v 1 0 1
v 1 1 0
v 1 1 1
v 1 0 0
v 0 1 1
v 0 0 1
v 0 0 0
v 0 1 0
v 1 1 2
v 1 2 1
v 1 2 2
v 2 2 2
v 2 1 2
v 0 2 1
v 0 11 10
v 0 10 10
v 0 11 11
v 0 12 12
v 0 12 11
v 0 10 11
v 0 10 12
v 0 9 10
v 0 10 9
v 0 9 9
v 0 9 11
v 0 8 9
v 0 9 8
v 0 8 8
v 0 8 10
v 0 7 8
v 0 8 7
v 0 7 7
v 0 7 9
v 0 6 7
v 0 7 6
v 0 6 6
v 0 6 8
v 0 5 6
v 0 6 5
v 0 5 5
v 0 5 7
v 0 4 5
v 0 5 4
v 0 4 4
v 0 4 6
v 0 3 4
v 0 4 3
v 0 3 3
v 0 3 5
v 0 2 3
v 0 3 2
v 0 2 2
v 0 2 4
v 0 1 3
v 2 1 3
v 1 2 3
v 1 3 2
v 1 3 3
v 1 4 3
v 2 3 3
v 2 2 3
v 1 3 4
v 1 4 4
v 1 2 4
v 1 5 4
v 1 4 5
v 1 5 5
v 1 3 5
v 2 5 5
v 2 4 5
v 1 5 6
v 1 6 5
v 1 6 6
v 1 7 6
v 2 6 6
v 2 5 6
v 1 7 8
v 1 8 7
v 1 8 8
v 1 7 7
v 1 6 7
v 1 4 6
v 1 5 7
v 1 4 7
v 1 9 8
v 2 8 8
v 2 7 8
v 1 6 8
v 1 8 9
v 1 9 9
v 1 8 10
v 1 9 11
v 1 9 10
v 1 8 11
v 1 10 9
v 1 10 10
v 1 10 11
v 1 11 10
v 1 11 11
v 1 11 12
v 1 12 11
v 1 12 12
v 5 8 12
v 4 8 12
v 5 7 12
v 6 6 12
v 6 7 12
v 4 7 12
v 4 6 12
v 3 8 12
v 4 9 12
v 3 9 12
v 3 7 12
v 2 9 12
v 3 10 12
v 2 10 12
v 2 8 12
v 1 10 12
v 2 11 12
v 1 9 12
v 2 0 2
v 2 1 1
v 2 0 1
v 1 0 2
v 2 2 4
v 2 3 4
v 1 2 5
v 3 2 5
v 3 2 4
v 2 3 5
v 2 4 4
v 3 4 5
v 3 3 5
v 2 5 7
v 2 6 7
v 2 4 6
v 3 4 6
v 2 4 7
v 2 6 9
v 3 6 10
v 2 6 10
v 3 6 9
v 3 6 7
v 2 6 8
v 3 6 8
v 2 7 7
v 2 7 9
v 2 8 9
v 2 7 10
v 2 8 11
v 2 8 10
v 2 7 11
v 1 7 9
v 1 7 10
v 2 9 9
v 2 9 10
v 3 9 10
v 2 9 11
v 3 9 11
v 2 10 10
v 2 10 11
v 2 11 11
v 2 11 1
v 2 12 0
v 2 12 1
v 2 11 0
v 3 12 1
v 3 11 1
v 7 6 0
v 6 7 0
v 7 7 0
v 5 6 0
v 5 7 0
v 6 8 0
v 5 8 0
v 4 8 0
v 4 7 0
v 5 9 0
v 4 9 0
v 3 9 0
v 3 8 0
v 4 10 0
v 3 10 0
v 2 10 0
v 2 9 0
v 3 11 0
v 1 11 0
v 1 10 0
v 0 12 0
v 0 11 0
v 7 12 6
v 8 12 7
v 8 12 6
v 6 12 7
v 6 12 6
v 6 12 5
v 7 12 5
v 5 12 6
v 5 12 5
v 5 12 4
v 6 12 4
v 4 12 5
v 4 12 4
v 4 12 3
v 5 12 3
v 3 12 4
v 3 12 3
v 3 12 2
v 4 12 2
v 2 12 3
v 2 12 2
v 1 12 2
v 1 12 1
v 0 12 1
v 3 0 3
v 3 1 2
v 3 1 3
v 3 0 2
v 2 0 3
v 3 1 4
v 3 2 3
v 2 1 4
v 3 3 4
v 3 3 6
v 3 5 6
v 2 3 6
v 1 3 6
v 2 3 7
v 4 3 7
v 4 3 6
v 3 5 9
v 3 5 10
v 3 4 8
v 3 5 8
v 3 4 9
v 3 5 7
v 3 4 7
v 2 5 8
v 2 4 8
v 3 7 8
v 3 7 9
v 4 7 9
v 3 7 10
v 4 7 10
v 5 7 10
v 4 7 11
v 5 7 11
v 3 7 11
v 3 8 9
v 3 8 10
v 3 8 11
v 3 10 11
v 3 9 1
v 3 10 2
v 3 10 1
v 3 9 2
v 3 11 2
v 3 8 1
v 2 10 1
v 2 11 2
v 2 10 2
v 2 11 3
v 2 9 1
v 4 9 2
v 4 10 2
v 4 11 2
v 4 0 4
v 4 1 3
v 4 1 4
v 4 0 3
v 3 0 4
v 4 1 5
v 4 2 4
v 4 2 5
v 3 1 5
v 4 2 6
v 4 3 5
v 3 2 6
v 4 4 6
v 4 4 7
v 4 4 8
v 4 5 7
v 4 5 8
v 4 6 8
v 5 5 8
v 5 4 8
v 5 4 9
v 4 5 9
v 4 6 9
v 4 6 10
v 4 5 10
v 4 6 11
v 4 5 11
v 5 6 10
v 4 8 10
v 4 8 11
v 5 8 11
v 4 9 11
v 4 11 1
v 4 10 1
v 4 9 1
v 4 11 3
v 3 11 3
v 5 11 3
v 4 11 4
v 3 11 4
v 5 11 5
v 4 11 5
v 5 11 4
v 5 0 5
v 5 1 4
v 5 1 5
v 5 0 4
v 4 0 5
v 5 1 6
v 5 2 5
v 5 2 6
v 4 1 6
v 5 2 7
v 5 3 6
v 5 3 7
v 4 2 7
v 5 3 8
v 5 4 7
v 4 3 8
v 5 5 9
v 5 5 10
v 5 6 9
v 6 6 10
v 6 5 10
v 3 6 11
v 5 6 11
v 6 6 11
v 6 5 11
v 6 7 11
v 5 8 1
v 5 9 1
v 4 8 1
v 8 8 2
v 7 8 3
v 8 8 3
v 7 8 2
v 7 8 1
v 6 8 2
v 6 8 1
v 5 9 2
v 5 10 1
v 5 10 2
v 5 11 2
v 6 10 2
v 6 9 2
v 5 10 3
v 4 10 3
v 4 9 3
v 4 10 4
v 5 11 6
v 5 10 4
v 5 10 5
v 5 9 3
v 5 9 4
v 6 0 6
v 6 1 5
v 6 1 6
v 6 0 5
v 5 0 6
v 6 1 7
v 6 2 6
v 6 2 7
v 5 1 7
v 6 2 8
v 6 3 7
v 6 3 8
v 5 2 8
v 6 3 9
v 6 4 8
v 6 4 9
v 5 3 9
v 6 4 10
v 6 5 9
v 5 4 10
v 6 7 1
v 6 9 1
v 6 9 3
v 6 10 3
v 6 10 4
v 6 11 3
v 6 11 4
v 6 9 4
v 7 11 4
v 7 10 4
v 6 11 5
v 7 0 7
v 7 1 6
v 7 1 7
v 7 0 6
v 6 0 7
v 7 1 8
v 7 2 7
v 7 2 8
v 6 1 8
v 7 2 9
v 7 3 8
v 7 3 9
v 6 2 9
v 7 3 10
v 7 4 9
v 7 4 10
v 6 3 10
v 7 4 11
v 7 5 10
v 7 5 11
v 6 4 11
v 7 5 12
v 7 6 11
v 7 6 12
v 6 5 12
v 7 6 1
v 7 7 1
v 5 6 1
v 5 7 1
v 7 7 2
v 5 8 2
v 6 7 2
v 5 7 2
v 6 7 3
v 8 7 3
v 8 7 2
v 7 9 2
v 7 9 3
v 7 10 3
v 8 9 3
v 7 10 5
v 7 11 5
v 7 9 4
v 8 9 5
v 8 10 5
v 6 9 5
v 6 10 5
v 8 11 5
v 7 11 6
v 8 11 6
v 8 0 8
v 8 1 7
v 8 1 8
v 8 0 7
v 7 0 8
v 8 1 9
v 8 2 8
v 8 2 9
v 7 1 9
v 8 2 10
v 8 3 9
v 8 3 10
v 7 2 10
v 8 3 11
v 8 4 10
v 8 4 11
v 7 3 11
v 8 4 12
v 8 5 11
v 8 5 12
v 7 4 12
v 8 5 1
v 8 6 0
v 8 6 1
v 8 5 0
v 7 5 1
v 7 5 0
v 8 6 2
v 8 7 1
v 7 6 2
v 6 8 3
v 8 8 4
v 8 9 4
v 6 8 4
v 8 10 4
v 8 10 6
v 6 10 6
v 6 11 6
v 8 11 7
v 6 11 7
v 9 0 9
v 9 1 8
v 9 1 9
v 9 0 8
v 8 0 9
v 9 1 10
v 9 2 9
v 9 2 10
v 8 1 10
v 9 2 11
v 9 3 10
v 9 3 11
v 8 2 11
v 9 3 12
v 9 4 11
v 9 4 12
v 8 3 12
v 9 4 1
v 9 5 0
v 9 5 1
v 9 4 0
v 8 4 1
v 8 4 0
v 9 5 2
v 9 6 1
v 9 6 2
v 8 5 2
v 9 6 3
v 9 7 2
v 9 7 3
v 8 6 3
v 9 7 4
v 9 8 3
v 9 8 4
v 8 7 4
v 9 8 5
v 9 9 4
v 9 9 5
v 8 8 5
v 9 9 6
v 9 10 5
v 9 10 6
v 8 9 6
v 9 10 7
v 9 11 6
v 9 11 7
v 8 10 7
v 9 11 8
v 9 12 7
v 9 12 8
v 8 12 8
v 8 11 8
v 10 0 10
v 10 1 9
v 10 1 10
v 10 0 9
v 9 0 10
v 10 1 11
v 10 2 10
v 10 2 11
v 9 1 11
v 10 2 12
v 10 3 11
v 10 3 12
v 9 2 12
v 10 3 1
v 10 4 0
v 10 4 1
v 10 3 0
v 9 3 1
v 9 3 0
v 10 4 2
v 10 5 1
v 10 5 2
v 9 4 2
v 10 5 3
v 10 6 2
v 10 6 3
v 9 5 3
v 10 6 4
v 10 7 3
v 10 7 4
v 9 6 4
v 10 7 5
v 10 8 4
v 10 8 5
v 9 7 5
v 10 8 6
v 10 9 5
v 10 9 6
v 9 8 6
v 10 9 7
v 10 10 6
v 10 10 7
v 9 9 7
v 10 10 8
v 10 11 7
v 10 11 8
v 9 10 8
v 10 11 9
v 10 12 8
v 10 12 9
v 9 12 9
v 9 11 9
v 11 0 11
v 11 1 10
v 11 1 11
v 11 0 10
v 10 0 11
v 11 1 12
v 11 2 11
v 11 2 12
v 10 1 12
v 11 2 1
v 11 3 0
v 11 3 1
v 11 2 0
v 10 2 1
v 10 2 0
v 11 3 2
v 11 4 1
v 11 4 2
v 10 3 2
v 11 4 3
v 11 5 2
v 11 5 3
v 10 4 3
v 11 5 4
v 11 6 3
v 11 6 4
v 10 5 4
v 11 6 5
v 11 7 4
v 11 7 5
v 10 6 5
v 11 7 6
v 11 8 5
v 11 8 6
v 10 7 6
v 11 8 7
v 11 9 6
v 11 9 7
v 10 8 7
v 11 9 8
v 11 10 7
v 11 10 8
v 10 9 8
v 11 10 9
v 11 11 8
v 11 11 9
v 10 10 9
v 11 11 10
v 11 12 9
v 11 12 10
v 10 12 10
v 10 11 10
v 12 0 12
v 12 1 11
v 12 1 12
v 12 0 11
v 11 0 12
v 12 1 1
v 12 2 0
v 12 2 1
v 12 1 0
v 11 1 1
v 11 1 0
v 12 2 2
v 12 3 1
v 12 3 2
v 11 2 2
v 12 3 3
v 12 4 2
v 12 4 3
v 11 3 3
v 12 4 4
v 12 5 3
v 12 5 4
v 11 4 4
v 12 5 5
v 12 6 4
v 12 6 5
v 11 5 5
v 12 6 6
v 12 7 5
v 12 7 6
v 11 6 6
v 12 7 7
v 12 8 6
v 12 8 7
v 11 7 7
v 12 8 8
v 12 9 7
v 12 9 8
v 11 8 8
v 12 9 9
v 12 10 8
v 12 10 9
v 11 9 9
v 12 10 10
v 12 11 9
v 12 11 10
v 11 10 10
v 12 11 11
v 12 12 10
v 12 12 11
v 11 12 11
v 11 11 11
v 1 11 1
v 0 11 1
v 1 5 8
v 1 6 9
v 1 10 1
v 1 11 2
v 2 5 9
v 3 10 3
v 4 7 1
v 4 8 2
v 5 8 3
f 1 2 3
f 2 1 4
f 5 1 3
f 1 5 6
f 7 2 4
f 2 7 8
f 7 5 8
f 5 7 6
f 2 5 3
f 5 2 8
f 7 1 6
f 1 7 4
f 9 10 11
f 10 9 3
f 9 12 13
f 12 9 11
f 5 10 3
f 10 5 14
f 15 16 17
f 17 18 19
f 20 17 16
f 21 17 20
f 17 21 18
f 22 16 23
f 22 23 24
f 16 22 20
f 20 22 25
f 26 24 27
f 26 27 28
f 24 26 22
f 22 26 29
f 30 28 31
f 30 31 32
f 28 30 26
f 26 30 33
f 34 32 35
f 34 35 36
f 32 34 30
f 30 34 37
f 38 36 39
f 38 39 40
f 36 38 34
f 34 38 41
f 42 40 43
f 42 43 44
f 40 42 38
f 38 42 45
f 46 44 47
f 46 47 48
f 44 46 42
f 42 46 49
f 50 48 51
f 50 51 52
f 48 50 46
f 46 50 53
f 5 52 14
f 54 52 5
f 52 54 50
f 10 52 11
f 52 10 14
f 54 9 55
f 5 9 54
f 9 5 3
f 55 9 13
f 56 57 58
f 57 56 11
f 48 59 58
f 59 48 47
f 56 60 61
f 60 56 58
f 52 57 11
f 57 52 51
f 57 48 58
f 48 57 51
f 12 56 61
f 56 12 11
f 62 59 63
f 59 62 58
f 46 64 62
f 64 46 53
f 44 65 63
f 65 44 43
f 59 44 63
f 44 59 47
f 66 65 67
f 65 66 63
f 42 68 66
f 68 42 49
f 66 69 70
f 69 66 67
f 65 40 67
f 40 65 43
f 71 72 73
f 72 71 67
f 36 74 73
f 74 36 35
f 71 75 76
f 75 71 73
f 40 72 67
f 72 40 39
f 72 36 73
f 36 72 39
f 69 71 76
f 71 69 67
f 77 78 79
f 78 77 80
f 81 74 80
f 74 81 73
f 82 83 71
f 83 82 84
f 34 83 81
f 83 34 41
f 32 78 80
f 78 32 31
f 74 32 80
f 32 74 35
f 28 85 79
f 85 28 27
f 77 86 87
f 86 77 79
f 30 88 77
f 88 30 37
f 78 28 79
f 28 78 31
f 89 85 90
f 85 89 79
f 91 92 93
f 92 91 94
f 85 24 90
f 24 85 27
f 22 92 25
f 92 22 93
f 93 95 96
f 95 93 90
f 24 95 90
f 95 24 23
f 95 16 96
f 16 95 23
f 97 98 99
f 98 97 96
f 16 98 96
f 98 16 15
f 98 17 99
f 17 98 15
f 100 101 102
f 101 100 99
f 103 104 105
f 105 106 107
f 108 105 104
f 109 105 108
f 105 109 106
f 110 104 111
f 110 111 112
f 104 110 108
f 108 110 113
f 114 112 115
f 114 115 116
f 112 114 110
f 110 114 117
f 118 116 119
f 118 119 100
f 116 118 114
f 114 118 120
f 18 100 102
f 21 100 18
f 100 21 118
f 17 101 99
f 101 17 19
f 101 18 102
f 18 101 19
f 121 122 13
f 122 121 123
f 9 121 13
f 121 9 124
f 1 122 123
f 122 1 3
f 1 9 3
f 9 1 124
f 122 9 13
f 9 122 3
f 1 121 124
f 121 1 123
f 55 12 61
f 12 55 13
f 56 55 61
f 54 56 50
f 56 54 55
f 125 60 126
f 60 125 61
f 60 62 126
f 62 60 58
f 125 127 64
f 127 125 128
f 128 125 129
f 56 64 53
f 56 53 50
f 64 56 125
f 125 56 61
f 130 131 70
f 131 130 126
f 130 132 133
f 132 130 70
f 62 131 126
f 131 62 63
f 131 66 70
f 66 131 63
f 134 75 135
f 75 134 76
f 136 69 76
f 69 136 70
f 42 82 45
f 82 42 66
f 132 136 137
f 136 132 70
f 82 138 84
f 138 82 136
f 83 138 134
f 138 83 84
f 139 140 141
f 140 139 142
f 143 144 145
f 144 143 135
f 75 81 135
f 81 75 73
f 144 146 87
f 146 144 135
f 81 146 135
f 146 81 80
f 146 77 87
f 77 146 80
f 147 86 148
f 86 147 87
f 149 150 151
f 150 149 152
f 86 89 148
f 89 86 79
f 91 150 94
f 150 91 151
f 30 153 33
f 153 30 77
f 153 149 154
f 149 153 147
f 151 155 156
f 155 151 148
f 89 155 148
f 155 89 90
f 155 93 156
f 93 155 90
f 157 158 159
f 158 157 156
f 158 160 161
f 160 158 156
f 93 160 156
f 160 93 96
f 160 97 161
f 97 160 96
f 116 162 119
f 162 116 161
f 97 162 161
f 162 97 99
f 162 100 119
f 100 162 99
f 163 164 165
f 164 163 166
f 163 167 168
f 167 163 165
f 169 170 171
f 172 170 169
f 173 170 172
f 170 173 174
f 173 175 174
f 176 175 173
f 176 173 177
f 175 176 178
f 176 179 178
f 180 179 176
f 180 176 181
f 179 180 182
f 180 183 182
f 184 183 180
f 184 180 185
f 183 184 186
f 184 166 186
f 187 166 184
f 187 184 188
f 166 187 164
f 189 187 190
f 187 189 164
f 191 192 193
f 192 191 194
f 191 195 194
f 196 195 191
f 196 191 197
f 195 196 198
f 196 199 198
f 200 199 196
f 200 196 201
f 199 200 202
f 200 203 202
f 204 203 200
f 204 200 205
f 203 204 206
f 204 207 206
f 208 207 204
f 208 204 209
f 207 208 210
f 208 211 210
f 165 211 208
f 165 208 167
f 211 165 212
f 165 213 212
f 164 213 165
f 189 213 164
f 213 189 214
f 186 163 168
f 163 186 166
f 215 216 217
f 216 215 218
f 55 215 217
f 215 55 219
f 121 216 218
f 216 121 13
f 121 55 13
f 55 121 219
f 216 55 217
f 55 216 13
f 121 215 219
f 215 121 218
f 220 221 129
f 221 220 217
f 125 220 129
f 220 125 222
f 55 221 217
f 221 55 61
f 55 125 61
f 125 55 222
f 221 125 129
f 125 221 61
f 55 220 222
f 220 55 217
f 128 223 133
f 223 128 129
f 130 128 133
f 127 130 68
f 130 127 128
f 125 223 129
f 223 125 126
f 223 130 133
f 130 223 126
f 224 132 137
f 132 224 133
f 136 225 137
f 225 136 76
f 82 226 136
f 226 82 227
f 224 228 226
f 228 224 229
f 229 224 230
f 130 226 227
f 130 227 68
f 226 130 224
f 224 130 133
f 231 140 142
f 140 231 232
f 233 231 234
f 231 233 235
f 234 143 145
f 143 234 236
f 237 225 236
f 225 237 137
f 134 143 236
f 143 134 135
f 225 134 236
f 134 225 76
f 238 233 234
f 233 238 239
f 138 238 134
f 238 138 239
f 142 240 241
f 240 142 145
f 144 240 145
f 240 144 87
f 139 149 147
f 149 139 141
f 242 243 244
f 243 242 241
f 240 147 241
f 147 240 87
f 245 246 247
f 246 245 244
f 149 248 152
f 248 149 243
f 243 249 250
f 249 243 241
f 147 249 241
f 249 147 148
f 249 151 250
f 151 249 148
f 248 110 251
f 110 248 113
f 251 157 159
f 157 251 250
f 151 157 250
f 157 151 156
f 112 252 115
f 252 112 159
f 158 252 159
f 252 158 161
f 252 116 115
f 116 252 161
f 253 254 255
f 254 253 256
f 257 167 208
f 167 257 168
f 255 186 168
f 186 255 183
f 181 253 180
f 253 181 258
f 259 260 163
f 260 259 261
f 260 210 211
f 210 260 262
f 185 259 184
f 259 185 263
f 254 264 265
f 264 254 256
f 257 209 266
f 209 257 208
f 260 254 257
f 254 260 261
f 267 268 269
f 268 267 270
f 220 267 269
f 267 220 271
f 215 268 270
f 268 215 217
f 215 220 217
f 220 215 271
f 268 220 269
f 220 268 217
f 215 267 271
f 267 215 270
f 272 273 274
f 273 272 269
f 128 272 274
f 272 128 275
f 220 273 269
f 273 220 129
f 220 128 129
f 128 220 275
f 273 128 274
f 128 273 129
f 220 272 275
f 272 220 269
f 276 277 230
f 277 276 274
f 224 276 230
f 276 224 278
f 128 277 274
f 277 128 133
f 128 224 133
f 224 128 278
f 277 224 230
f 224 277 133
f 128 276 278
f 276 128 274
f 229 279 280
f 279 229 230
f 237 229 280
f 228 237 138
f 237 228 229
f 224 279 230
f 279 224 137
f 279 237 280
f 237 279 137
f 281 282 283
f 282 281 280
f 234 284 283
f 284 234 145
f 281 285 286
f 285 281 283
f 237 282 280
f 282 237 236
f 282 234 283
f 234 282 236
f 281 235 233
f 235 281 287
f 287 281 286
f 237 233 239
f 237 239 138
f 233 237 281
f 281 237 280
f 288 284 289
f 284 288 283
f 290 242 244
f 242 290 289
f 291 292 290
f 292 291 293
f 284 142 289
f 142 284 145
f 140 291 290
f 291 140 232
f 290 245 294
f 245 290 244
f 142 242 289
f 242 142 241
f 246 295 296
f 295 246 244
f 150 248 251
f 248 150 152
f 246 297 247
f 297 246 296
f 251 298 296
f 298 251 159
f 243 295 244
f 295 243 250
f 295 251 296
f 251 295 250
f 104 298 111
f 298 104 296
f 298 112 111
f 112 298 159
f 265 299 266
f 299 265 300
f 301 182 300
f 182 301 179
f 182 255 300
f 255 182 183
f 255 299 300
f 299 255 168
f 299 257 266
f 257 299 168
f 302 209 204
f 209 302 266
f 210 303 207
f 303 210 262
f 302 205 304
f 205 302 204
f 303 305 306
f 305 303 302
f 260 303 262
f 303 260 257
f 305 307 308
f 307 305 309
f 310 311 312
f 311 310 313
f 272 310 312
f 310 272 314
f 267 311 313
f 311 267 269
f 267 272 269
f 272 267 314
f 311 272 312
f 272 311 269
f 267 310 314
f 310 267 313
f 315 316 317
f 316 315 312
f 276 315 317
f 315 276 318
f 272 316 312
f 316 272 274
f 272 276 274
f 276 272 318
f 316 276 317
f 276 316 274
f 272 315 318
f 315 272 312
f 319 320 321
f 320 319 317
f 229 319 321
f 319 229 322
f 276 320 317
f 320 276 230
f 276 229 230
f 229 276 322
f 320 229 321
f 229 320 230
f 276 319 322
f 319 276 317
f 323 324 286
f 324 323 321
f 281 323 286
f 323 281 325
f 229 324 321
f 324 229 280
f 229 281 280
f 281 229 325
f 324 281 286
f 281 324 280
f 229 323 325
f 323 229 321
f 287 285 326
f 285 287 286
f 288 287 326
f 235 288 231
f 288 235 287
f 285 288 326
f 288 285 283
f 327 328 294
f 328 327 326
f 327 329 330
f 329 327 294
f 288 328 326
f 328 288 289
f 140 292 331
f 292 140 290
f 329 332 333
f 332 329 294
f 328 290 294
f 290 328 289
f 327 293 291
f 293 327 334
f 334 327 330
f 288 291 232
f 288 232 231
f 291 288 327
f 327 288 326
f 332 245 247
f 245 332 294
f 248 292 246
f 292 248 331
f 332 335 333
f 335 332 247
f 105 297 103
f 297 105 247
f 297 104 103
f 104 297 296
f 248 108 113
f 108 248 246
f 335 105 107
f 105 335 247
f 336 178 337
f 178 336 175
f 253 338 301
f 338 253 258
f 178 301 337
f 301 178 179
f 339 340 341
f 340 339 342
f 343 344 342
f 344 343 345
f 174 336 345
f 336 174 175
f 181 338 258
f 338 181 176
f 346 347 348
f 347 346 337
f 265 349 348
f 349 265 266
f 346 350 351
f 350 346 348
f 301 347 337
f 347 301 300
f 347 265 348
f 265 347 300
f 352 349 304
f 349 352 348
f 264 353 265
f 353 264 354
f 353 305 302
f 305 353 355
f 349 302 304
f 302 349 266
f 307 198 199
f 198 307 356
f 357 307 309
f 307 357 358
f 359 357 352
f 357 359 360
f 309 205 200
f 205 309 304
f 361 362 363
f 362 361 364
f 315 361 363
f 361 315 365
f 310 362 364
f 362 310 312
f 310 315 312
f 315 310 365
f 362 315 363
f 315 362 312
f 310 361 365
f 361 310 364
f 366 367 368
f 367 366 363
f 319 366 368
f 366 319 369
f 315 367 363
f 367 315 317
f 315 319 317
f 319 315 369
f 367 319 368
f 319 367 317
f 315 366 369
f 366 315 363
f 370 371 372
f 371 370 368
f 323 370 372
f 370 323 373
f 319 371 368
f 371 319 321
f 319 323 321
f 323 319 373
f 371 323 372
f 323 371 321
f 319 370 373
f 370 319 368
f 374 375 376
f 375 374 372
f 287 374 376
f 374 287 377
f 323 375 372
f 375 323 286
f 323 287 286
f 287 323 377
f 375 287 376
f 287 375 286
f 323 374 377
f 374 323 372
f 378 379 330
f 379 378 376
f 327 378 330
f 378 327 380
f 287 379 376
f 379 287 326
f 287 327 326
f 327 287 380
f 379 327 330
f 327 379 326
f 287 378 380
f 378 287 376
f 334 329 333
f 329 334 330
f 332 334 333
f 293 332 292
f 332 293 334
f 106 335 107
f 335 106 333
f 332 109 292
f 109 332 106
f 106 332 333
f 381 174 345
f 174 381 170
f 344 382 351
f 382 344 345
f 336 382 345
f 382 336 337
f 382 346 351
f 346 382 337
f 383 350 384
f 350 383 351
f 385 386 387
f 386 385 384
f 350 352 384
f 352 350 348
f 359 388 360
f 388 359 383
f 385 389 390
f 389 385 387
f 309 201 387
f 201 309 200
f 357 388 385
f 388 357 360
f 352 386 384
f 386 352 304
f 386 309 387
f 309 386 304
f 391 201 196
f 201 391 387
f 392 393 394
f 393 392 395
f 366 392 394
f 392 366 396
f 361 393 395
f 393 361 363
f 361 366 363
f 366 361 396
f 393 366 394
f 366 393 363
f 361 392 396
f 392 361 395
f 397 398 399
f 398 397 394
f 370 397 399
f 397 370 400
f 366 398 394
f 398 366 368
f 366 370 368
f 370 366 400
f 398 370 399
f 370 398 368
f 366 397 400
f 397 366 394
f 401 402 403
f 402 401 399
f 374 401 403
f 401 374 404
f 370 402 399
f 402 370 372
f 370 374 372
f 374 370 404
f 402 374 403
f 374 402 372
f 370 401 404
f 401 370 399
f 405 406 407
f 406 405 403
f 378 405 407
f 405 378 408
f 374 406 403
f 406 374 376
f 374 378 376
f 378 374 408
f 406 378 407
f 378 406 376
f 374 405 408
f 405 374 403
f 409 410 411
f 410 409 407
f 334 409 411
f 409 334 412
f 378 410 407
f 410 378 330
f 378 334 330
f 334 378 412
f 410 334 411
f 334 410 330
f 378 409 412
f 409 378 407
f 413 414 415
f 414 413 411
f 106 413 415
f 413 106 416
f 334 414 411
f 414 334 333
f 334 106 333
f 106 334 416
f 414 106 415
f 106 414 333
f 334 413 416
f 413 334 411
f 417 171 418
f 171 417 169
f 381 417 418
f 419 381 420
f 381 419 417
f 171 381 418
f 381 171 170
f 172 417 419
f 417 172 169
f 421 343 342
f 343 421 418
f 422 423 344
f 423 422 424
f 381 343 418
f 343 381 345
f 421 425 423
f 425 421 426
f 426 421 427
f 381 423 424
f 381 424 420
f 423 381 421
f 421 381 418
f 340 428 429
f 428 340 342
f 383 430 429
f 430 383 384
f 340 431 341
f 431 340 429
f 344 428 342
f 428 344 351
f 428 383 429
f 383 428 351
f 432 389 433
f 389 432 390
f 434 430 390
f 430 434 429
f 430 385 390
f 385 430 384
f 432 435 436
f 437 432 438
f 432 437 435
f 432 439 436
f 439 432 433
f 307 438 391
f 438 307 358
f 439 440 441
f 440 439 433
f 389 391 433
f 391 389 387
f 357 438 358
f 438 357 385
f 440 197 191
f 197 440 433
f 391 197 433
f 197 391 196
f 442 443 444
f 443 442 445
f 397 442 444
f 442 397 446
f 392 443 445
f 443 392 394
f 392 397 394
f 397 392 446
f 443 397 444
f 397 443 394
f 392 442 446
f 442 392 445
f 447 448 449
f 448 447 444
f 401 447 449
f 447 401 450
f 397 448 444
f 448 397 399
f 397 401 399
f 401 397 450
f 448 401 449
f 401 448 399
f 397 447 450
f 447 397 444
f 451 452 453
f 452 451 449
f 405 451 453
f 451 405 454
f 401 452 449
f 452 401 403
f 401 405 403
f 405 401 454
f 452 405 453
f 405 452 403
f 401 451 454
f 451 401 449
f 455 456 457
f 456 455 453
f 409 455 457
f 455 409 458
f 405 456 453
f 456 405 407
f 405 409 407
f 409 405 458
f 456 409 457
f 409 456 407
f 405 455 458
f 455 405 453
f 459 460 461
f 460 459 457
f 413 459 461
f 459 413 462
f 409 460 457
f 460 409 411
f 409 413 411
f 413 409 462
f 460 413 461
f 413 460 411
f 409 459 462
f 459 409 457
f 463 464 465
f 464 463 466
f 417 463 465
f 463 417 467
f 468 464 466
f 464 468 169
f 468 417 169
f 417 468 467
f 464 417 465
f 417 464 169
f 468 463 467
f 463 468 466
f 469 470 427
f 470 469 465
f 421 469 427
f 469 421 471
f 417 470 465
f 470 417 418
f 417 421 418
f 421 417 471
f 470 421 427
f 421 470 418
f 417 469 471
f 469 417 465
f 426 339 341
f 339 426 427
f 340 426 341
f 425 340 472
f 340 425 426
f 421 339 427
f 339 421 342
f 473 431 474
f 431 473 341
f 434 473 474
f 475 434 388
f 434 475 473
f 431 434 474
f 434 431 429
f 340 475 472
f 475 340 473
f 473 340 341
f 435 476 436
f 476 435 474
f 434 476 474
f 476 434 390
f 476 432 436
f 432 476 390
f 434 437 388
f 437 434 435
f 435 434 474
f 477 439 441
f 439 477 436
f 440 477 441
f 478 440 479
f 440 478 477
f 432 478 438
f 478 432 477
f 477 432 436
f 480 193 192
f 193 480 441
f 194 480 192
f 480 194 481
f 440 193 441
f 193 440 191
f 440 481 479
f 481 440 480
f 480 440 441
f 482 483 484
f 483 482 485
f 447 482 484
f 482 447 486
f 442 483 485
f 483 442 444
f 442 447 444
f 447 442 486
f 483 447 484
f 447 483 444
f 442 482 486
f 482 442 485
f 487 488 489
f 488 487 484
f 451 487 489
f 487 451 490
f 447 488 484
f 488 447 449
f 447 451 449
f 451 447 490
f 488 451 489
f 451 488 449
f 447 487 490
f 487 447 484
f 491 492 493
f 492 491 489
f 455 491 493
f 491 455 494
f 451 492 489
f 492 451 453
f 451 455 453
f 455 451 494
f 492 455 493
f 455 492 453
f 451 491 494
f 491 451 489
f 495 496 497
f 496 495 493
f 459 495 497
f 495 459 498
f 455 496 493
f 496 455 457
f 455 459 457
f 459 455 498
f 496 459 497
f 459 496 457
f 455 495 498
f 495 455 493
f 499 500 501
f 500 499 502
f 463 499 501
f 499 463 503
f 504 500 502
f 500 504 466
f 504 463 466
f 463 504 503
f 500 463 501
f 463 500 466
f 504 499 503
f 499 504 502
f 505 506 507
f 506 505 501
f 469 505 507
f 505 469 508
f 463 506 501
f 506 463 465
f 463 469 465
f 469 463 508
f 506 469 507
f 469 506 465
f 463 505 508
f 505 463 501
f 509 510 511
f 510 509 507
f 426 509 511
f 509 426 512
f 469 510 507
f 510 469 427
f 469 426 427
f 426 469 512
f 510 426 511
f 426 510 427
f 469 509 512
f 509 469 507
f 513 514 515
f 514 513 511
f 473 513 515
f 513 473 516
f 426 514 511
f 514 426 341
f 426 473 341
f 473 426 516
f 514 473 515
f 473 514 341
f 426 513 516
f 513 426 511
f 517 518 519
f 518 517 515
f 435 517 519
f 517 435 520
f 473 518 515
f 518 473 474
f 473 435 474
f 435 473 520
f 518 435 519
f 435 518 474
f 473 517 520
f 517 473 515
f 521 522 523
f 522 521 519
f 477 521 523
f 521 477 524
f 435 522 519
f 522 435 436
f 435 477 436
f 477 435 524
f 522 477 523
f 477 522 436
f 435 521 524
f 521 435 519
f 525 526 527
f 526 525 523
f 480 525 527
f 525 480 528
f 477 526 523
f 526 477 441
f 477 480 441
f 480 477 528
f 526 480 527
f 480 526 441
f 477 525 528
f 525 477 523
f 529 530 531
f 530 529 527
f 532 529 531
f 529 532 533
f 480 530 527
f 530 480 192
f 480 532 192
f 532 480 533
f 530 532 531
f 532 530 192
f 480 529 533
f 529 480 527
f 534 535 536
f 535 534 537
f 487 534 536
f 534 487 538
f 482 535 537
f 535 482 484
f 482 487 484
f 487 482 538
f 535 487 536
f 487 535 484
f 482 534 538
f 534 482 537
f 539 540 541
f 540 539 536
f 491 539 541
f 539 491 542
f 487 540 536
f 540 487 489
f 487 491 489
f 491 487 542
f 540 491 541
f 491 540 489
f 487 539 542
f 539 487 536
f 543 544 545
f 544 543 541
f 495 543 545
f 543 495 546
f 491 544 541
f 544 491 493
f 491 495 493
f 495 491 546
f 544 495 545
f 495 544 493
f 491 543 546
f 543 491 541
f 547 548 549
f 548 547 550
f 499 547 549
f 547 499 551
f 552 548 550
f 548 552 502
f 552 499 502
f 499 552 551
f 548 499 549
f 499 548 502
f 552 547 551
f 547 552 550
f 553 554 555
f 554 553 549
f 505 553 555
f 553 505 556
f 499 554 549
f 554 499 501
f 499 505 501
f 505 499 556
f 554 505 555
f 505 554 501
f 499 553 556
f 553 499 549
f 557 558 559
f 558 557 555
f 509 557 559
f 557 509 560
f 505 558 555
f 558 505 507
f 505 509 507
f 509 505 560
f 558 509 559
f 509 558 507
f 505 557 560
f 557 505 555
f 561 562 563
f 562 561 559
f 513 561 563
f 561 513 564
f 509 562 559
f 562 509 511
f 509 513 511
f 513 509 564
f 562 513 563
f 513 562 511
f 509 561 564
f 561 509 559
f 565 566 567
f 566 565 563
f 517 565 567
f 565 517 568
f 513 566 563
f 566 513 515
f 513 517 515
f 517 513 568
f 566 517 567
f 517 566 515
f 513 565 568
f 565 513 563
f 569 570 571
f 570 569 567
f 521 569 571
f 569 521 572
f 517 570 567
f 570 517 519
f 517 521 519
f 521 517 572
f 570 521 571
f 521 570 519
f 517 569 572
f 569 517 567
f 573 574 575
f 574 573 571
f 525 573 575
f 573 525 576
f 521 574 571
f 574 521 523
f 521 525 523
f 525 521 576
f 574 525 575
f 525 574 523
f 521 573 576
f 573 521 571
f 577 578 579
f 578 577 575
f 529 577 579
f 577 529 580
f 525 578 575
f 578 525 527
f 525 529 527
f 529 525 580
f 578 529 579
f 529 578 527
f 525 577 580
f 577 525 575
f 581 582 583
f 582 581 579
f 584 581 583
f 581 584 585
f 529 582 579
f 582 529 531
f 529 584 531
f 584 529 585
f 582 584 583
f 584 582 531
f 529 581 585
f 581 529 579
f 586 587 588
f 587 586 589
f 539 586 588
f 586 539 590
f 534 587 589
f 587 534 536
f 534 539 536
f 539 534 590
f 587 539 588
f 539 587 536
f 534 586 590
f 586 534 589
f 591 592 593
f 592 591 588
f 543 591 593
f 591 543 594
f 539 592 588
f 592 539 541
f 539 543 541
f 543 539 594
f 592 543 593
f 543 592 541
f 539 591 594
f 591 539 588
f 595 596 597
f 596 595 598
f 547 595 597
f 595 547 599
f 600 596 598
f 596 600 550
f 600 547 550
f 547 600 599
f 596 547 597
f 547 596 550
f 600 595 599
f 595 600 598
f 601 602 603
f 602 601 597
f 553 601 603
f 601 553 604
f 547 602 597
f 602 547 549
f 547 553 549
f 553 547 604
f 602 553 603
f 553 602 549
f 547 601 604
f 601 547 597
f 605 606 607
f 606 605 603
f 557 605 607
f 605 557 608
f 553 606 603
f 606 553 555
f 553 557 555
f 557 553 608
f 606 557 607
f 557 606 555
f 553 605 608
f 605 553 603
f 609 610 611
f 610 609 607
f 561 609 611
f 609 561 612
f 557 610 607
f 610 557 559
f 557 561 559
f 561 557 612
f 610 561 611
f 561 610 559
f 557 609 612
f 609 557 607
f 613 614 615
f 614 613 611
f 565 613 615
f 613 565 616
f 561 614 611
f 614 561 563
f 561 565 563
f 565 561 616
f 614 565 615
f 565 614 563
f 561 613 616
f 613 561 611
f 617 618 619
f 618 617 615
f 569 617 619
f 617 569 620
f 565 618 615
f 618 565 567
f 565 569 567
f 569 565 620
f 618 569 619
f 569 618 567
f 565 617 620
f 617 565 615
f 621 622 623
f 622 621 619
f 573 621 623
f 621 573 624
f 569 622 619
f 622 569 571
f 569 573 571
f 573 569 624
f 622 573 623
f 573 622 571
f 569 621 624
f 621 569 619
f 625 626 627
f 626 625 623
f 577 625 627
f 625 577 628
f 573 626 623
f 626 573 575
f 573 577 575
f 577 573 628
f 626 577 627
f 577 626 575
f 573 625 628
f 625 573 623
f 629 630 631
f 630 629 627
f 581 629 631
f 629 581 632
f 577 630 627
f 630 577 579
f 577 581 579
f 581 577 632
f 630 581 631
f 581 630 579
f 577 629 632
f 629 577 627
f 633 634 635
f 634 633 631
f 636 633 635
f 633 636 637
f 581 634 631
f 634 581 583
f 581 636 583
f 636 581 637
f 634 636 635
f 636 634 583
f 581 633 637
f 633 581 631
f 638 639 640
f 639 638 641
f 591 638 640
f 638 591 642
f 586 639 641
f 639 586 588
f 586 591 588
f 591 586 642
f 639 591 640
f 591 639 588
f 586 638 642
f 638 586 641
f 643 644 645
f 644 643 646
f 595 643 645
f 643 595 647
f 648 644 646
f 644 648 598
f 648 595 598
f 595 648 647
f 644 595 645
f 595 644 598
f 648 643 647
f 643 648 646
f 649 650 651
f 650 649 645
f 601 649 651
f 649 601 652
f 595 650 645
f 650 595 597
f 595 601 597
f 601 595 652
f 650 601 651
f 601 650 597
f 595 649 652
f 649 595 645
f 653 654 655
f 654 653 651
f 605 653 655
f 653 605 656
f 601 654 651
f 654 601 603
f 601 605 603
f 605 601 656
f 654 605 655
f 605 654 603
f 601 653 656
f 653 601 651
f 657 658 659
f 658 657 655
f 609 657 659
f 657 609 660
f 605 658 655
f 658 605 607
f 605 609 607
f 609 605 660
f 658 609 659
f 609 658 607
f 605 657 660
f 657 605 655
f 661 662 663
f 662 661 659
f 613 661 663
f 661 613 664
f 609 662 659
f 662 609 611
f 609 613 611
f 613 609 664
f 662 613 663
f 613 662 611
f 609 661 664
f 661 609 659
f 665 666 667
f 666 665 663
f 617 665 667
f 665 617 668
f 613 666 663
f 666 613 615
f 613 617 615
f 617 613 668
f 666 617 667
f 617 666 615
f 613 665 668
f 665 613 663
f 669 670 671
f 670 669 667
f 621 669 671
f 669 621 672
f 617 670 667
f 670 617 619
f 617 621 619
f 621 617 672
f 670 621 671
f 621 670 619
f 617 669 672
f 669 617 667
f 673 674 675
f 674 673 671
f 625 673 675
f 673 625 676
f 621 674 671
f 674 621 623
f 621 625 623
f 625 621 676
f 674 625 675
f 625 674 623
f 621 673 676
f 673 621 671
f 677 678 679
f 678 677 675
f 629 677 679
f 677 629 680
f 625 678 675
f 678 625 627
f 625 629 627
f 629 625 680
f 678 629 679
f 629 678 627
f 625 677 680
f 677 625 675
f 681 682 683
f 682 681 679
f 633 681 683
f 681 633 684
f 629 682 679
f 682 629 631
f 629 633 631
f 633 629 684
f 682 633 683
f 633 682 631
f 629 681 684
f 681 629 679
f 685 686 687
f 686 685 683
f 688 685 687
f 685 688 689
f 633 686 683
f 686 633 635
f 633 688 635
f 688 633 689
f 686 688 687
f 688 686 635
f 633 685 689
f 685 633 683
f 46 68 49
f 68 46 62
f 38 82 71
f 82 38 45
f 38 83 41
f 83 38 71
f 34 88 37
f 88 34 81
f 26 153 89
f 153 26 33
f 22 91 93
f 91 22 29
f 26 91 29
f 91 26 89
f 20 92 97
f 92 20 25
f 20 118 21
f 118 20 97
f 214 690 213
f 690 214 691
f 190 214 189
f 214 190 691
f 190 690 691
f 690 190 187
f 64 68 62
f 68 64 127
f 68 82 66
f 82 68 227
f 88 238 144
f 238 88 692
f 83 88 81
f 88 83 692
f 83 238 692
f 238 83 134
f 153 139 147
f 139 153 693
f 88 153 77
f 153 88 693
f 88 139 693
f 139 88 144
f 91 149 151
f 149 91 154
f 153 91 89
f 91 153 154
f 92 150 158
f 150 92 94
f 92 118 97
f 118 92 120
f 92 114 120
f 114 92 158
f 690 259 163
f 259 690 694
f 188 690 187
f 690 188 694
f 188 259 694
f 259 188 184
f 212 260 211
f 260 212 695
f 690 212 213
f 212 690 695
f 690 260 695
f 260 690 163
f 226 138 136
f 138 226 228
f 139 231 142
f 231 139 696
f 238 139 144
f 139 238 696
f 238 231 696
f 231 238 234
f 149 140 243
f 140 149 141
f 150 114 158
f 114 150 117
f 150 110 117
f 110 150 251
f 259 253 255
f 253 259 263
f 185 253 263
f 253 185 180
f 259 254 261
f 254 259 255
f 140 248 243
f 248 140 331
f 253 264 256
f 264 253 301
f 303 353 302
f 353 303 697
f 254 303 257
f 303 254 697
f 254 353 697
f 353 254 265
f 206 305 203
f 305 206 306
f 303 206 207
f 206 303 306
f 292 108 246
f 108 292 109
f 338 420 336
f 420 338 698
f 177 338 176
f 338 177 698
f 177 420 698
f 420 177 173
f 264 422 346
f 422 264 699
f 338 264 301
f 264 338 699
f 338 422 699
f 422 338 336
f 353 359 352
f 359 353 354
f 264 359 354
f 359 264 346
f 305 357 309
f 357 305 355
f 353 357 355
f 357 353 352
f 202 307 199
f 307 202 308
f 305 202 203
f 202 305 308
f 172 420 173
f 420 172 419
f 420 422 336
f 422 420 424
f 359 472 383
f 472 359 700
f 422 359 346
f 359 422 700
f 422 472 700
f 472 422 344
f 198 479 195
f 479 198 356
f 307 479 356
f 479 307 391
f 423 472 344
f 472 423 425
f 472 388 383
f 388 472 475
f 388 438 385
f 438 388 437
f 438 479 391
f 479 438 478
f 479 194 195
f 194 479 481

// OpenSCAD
union() {
    translate([0.0, 0.0, 0.0]) cube([1, 1, 1]);
    translate([0.0, 1.0, 1.0]) cube([1, 1, 1]);
    translate([0.0, 2.0, 2.0]) cube([1, 1, 1]);
    translate([0.0, 3.0, 3.0]) cube([1, 1, 1]);
    translate([0.0, 4.0, 4.0]) cube([1, 1, 1]);
    translate([0.0, 5.0, 5.0]) cube([1, 1, 1]);
    translate([0.0, 6.0, 6.0]) cube([1, 1, 1]);
    translate([0.0, 7.0, 7.0]) cube([1, 1, 1]);
    translate([0.0, 8.0, 8.0]) cube([1, 1, 1]);
    translate([0.0, 9.0, 9.0]) cube([1, 1, 1]);
    translate([0.0, 10.0, 10.0]) cube([1, 1, 1]);
    translate([0.0, 11.0, 11.0]) cube([1, 1, 1]);
    translate([1.0, 0.0, 1.0]) cube([1, 1, 1]);
    translate([1.0, 1.0, 2.0]) cube([1, 1, 1]);
    translate([1.0, 2.0, 3.0]) cube([1, 1, 1]);
    translate([1.0, 3.0, 4.0]) cube([1, 1, 1]);
    translate([1.0, 4.0, 5.0]) cube([1, 1, 1]);
    translate([1.0, 5.0, 6.0]) cube([1, 1, 1]);
    translate([1.0, 6.0, 7.0]) cube([1, 1, 1]);
    translate([1.0, 7.0, 8.0]) cube([1, 1, 1]);
    translate([1.0, 8.0, 9.0]) cube([1, 1, 1]);
    translate([1.0, 9.0, 10.0]) cube([1, 1, 1]);
    translate([1.0, 10.0, 11.0]) cube([1, 1, 1]);
    translate([1.0, 11.0, 0.0]) cube([1, 1, 1]);
    translate([2.0, 0.0, 2.0]) cube([1, 1, 1]);
    translate([2.0, 1.0, 3.0]) cube([1, 1, 1]);
    translate([2.0, 2.0, 4.0]) cube([1, 1, 1]);
    translate([2.0, 3.0, 5.0]) cube([1, 1, 1]);
    translate([2.0, 4.0, 6.0]) cube([1, 1, 1]);
    translate([2.0, 5.0, 7.0]) cube([1, 1, 1]);
    translate([2.0, 6.0, 8.0]) cube([1, 1, 1]);
    translate([2.0, 7.0, 9.0]) cube([1, 1, 1]);
    translate([2.0, 8.0, 10.0]) cube([1, 1, 1]);
    translate([2.0, 9.0, 11.0]) cube([1, 1, 1]);
    translate([2.0, 10.0, 0.0]) cube([1, 1, 1]);
    translate([2.0, 11.0, 1.0]) cube([1, 1, 1]);
    translate([3.0, 0.0, 3.0]) cube([1, 1, 1]);
    translate([3.0, 1.0, 4.0]) cube([1, 1, 1]);
    translate([3.0, 2.0, 5.0]) cube([1, 1, 1]);
    translate([3.0, 3.0, 6.0]) cube([1, 1, 1]);
    translate([3.0, 4.0, 7.0]) cube([1, 1, 1]);
    translate([3.0, 5.0, 8.0]) cube([1, 1, 1]);
    translate([3.0, 6.0, 9.0]) cube([1, 1, 1]);
    translate([3.0, 7.0, 10.0]) cube([1, 1, 1]);
    translate([3.0, 8.0, 11.0]) cube([1, 1, 1]);
    translate([3.0, 9.0, 0.0]) cube([1, 1, 1]);
    translate([3.0, 10.0, 1.0]) cube([1, 1, 1]);
    translate([3.0, 11.0, 2.0]) cube([1, 1, 1]);
    translate([4.0, 0.0, 4.0]) cube([1, 1, 1]);
    translate([4.0, 1.0, 5.0]) cube([1, 1, 1]);
    translate([4.0, 2.0, 6.0]) cube([1, 1, 1]);
    translate([4.0, 3.0, 7.0]) cube([1, 1, 1]);
    translate([4.0, 4.0, 8.0]) cube([1, 1, 1]);
    translate([4.0, 5.0, 9.0]) cube([1, 1, 1]);
    translate([4.0, 6.0, 10.0]) cube([1, 1, 1]);
    translate([4.0, 7.0, 11.0]) cube([1, 1, 1]);
    translate([4.0, 8.0, 0.0]) cube([1, 1, 1]);
    translate([4.0, 9.0, 1.0]) cube([1, 1, 1]);
    translate([4.0, 10.0, 2.0]) cube([1, 1, 1]);
    translate([4.0, 11.0, 3.0]) cube([1, 1, 1]);
    translate([5.0, 0.0, 5.0]) cube([1, 1, 1]);
    translate([5.0, 1.0, 6.0]) cube([1, 1, 1]);
    translate([5.0, 2.0, 7.0]) cube([1, 1, 1]);
    translate([5.0, 3.0, 8.0]) cube([1, 1, 1]);
    translate([5.0, 4.0, 9.0]) cube([1, 1, 1]);
    translate([5.0, 5.0, 10.0]) cube([1, 1, 1]);
    translate([5.0, 6.0, 11.0]) cube([1, 1, 1]);
    translate([5.0, 7.0, 0.0]) cube([1, 1, 1]);
    translate([5.0, 8.0, 1.0]) cube([1, 1, 1]);
    translate([5.0, 9.0, 2.0]) cube([1, 1, 1]);
    translate([5.0, 10.0, 3.0]) cube([1, 1, 1]);
    translate([5.0, 11.0, 4.0]) cube([1, 1, 1]);
    translate([6.0, 0.0, 6.0]) cube([1, 1, 1]);
    translate([6.0, 1.0, 7.0]) cube([1, 1, 1]);
    translate([6.0, 2.0, 8.0]) cube([1, 1, 1]);
    translate([6.0, 3.0, 9.0]) cube([1, 1, 1]);
    translate([6.0, 4.0, 10.0]) cube([1, 1, 1]);
    translate([6.0, 5.0, 11.0]) cube([1, 1, 1]);
    translate([6.0, 6.0, 0.0]) cube([1, 1, 1]);
    translate([6.0, 7.0, 1.0]) cube([1, 1, 1]);
    translate([6.0, 8.0, 2.0]) cube([1, 1, 1]);
    translate([6.0, 9.0, 3.0]) cube([1, 1, 1]);
    translate([6.0, 10.0, 4.0]) cube([1, 1, 1]);
    translate([6.0, 11.0, 5.0]) cube([1, 1, 1]);
    translate([7.0, 0.0, 7.0]) cube([1, 1, 1]);
    translate([7.0, 1.0, 8.0]) cube([1, 1, 1]);
    translate([7.0, 2.0, 9.0]) cube([1, 1, 1]);
    translate([7.0, 3.0, 10.0]) cube([1, 1, 1]);
    translate([7.0, 4.0, 11.0]) cube([1, 1, 1]);
    translate([7.0, 5.0, 0.0]) cube([1, 1, 1]);
    translate([7.0, 6.0, 1.0]) cube([1, 1, 1]);
    translate([7.0, 7.0, 2.0]) cube([1, 1, 1]);
    translate([7.0, 8.0, 3.0]) cube([1, 1, 1]);
    translate([7.0, 9.0, 4.0]) cube([1, 1, 1]);
    translate([7.0, 10.0, 5.0]) cube([1, 1, 1]);
    translate([7.0, 11.0, 6.0]) cube([1, 1, 1]);
    translate([8.0, 0.0, 8.0]) cube([1, 1, 1]);
    translate([8.0, 1.0, 9.0]) cube([1, 1, 1]);
    translate([8.0, 2.0, 10.0]) cube([1, 1, 1]);
    translate([8.0, 3.0, 11.0]) cube([1, 1, 1]);
    translate([8.0, 4.0, 0.0]) cube([1, 1, 1]);
    translate([8.0, 5.0, 1.0]) cube([1, 1, 1]);
    translate([8.0, 6.0, 2.0]) cube([1, 1, 1]);
    translate([8.0, 7.0, 3.0]) cube([1, 1, 1]);
    translate([8.0, 8.0, 4.0]) cube([1, 1, 1]);
    translate([8.0, 9.0, 5.0]) cube([1, 1, 1]);
    translate([8.0, 10.0, 6.0]) cube([1, 1, 1]);
    translate([8.0, 11.0, 7.0]) cube([1, 1, 1]);
    translate([9.0, 0.0, 9.0]) cube([1, 1, 1]);
    translate([9.0, 1.0, 10.0]) cube([1, 1, 1]);
    translate([9.0, 2.0, 11.0]) cube([1, 1, 1]);
    translate([9.0, 3.0, 0.0]) cube([1, 1, 1]);
    translate([9.0, 4.0, 1.0]) cube([1, 1, 1]);
    translate([9.0, 5.0, 2.0]) cube([1, 1, 1]);
    translate([9.0, 6.0, 3.0]) cube([1, 1, 1]);
    translate([9.0, 7.0, 4.0]) cube([1, 1, 1]);
    translate([9.0, 8.0, 5.0]) cube([1, 1, 1]);
    translate([9.0, 9.0, 6.0]) cube([1, 1, 1]);
    translate([9.0, 10.0, 7.0]) cube([1, 1, 1]);
    translate([9.0, 11.0, 8.0]) cube([1, 1, 1]);
    translate([10.0, 0.0, 10.0]) cube([1, 1, 1]);
    translate([10.0, 1.0, 11.0]) cube([1, 1, 1]);
    translate([10.0, 2.0, 0.0]) cube([1, 1, 1]);
    translate([10.0, 3.0, 1.0]) cube([1, 1, 1]);
    translate([10.0, 4.0, 2.0]) cube([1, 1, 1]);
    translate([10.0, 5.0, 3.0]) cube([1, 1, 1]);
    translate([10.0, 6.0, 4.0]) cube([1, 1, 1]);
    translate([10.0, 7.0, 5.0]) cube([1, 1, 1]);
    translate([10.0, 8.0, 6.0]) cube([1, 1, 1]);
    translate([10.0, 9.0, 7.0]) cube([1, 1, 1]);
    translate([10.0, 10.0, 8.0]) cube([1, 1, 1]);
    translate([10.0, 11.0, 9.0]) cube([1, 1, 1]);
    translate([11.0, 0.0, 11.0]) cube([1, 1, 1]);
    translate([11.0, 1.0, 0.0]) cube([1, 1, 1]);
    translate([11.0, 2.0, 1.0]) cube([1, 1, 1]);
    translate([11.0, 3.0, 2.0]) cube([1, 1, 1]);
    translate([11.0, 4.0, 3.0]) cube([1, 1, 1]);
    translate([11.0, 5.0, 4.0]) cube([1, 1, 1]);
    translate([11.0, 6.0, 5.0]) cube([1, 1, 1]);
    translate([11.0, 7.0, 6.0]) cube([1, 1, 1]);
    translate([11.0, 8.0, 7.0]) cube([1, 1, 1]);
    translate([11.0, 9.0, 8.0]) cube([1, 1, 1]);
    translate([11.0, 10.0, 9.0]) cube([1, 1, 1]);
    translate([11.0, 11.0, 10.0]) cube([1, 1, 1]);
    translate([0.0, 1.0, 2.0]) cube([1, 1, 1]);
    translate([0.0, 2.0, 3.0]) cube([1, 1, 1]);
    translate([0.0, 3.0, 4.0]) cube([1, 1, 1]);
    translate([0.0, 4.0, 5.0]) cube([1, 1, 1]);
    translate([0.0, 5.0, 6.0]) cube([1, 1, 1]);
    translate([0.0, 6.0, 7.0]) cube([1, 1, 1]);
    translate([0.0, 7.0, 8.0]) cube([1, 1, 1]);
    translate([0.0, 8.0, 9.0]) cube([1, 1, 1]);
    translate([0.0, 9.0, 10.0]) cube([1, 1, 1]);
    translate([0.0, 10.0, 11.0]) cube([1, 1, 1]);
    translate([0.0, 11.0, 0.0]) cube([1, 1, 1]);
    translate([1.0, 2.0, 4.0]) cube([1, 1, 1]);
    translate([1.0, 3.0, 5.0]) cube([1, 1, 1]);
    translate([1.0, 4.0, 6.0]) cube([1, 1, 1]);
    translate([1.0, 5.0, 7.0]) cube([1, 1, 1]);
    translate([1.0, 6.0, 8.0]) cube([1, 1, 1]);
    translate([1.0, 7.0, 9.0]) cube([1, 1, 1]);
    translate([1.0, 8.0, 10.0]) cube([1, 1, 1]);
    translate([1.0, 9.0, 11.0]) cube([1, 1, 1]);
    translate([1.0, 10.0, 0.0]) cube([1, 1, 1]);
    translate([1.0, 11.0, 1.0]) cube([1, 1, 1]);
    translate([2.0, 3.0, 6.0]) cube([1, 1, 1]);
    translate([2.0, 4.0, 7.0]) cube([1, 1, 1]);
    translate([2.0, 5.0, 8.0]) cube([1, 1, 1]);
    translate([2.0, 6.0, 9.0]) cube([1, 1, 1]);
    translate([2.0, 7.0, 10.0]) cube([1, 1, 1]);
    translate([2.0, 8.0, 11.0]) cube([1, 1, 1]);
    translate([2.0, 9.0, 0.0]) cube([1, 1, 1]);
    translate([2.0, 10.0, 1.0]) cube([1, 1, 1]);
    translate([2.0, 11.0, 2.0]) cube([1, 1, 1]);
    translate([3.0, 4.0, 8.0]) cube([1, 1, 1]);
    translate([3.0, 5.0, 9.0]) cube([1, 1, 1]);
    translate([3.0, 6.0, 10.0]) cube([1, 1, 1]);
    translate([3.0, 7.0, 11.0]) cube([1, 1, 1]);
    translate([3.0, 8.0, 0.0]) cube([1, 1, 1]);
    translate([3.0, 9.0, 1.0]) cube([1, 1, 1]);
    translate([3.0, 10.0, 2.0]) cube([1, 1, 1]);
    translate([3.0, 11.0, 3.0]) cube([1, 1, 1]);
    translate([4.0, 5.0, 10.0]) cube([1, 1, 1]);
    translate([4.0, 6.0, 11.0]) cube([1, 1, 1]);
    translate([4.0, 7.0, 0.0]) cube([1, 1, 1]);
    translate([4.0, 8.0, 1.0]) cube([1, 1, 1]);
    translate([4.0, 9.0, 2.0]) cube([1, 1, 1]);
    translate([4.0, 10.0, 3.0]) cube([1, 1, 1]);
    translate([4.0, 11.0, 4.0]) cube([1, 1, 1]);
    translate([5.0, 6.0, 0.0]) cube([1, 1, 1]);
    translate([5.0, 7.0, 1.0]) cube([1, 1, 1]);
    translate([5.0, 8.0, 2.0]) cube([1, 1, 1]);
    translate([5.0, 9.0, 3.0]) cube([1, 1, 1]);
    translate([5.0, 10.0, 4.0]) cube([1, 1, 1]);
    translate([5.0, 11.0, 5.0]) cube([1, 1, 1]);
    translate([6.0, 7.0, 2.0]) cube([1, 1, 1]);
    translate([6.0, 8.0, 3.0]) cube([1, 1, 1]);
    translate([6.0, 9.0, 4.0]) cube([1, 1, 1]);
    translate([6.0, 10.0, 5.0]) cube([1, 1, 1]);
    translate([6.0, 11.0, 6.0]) cube([1, 1, 1]);
}
